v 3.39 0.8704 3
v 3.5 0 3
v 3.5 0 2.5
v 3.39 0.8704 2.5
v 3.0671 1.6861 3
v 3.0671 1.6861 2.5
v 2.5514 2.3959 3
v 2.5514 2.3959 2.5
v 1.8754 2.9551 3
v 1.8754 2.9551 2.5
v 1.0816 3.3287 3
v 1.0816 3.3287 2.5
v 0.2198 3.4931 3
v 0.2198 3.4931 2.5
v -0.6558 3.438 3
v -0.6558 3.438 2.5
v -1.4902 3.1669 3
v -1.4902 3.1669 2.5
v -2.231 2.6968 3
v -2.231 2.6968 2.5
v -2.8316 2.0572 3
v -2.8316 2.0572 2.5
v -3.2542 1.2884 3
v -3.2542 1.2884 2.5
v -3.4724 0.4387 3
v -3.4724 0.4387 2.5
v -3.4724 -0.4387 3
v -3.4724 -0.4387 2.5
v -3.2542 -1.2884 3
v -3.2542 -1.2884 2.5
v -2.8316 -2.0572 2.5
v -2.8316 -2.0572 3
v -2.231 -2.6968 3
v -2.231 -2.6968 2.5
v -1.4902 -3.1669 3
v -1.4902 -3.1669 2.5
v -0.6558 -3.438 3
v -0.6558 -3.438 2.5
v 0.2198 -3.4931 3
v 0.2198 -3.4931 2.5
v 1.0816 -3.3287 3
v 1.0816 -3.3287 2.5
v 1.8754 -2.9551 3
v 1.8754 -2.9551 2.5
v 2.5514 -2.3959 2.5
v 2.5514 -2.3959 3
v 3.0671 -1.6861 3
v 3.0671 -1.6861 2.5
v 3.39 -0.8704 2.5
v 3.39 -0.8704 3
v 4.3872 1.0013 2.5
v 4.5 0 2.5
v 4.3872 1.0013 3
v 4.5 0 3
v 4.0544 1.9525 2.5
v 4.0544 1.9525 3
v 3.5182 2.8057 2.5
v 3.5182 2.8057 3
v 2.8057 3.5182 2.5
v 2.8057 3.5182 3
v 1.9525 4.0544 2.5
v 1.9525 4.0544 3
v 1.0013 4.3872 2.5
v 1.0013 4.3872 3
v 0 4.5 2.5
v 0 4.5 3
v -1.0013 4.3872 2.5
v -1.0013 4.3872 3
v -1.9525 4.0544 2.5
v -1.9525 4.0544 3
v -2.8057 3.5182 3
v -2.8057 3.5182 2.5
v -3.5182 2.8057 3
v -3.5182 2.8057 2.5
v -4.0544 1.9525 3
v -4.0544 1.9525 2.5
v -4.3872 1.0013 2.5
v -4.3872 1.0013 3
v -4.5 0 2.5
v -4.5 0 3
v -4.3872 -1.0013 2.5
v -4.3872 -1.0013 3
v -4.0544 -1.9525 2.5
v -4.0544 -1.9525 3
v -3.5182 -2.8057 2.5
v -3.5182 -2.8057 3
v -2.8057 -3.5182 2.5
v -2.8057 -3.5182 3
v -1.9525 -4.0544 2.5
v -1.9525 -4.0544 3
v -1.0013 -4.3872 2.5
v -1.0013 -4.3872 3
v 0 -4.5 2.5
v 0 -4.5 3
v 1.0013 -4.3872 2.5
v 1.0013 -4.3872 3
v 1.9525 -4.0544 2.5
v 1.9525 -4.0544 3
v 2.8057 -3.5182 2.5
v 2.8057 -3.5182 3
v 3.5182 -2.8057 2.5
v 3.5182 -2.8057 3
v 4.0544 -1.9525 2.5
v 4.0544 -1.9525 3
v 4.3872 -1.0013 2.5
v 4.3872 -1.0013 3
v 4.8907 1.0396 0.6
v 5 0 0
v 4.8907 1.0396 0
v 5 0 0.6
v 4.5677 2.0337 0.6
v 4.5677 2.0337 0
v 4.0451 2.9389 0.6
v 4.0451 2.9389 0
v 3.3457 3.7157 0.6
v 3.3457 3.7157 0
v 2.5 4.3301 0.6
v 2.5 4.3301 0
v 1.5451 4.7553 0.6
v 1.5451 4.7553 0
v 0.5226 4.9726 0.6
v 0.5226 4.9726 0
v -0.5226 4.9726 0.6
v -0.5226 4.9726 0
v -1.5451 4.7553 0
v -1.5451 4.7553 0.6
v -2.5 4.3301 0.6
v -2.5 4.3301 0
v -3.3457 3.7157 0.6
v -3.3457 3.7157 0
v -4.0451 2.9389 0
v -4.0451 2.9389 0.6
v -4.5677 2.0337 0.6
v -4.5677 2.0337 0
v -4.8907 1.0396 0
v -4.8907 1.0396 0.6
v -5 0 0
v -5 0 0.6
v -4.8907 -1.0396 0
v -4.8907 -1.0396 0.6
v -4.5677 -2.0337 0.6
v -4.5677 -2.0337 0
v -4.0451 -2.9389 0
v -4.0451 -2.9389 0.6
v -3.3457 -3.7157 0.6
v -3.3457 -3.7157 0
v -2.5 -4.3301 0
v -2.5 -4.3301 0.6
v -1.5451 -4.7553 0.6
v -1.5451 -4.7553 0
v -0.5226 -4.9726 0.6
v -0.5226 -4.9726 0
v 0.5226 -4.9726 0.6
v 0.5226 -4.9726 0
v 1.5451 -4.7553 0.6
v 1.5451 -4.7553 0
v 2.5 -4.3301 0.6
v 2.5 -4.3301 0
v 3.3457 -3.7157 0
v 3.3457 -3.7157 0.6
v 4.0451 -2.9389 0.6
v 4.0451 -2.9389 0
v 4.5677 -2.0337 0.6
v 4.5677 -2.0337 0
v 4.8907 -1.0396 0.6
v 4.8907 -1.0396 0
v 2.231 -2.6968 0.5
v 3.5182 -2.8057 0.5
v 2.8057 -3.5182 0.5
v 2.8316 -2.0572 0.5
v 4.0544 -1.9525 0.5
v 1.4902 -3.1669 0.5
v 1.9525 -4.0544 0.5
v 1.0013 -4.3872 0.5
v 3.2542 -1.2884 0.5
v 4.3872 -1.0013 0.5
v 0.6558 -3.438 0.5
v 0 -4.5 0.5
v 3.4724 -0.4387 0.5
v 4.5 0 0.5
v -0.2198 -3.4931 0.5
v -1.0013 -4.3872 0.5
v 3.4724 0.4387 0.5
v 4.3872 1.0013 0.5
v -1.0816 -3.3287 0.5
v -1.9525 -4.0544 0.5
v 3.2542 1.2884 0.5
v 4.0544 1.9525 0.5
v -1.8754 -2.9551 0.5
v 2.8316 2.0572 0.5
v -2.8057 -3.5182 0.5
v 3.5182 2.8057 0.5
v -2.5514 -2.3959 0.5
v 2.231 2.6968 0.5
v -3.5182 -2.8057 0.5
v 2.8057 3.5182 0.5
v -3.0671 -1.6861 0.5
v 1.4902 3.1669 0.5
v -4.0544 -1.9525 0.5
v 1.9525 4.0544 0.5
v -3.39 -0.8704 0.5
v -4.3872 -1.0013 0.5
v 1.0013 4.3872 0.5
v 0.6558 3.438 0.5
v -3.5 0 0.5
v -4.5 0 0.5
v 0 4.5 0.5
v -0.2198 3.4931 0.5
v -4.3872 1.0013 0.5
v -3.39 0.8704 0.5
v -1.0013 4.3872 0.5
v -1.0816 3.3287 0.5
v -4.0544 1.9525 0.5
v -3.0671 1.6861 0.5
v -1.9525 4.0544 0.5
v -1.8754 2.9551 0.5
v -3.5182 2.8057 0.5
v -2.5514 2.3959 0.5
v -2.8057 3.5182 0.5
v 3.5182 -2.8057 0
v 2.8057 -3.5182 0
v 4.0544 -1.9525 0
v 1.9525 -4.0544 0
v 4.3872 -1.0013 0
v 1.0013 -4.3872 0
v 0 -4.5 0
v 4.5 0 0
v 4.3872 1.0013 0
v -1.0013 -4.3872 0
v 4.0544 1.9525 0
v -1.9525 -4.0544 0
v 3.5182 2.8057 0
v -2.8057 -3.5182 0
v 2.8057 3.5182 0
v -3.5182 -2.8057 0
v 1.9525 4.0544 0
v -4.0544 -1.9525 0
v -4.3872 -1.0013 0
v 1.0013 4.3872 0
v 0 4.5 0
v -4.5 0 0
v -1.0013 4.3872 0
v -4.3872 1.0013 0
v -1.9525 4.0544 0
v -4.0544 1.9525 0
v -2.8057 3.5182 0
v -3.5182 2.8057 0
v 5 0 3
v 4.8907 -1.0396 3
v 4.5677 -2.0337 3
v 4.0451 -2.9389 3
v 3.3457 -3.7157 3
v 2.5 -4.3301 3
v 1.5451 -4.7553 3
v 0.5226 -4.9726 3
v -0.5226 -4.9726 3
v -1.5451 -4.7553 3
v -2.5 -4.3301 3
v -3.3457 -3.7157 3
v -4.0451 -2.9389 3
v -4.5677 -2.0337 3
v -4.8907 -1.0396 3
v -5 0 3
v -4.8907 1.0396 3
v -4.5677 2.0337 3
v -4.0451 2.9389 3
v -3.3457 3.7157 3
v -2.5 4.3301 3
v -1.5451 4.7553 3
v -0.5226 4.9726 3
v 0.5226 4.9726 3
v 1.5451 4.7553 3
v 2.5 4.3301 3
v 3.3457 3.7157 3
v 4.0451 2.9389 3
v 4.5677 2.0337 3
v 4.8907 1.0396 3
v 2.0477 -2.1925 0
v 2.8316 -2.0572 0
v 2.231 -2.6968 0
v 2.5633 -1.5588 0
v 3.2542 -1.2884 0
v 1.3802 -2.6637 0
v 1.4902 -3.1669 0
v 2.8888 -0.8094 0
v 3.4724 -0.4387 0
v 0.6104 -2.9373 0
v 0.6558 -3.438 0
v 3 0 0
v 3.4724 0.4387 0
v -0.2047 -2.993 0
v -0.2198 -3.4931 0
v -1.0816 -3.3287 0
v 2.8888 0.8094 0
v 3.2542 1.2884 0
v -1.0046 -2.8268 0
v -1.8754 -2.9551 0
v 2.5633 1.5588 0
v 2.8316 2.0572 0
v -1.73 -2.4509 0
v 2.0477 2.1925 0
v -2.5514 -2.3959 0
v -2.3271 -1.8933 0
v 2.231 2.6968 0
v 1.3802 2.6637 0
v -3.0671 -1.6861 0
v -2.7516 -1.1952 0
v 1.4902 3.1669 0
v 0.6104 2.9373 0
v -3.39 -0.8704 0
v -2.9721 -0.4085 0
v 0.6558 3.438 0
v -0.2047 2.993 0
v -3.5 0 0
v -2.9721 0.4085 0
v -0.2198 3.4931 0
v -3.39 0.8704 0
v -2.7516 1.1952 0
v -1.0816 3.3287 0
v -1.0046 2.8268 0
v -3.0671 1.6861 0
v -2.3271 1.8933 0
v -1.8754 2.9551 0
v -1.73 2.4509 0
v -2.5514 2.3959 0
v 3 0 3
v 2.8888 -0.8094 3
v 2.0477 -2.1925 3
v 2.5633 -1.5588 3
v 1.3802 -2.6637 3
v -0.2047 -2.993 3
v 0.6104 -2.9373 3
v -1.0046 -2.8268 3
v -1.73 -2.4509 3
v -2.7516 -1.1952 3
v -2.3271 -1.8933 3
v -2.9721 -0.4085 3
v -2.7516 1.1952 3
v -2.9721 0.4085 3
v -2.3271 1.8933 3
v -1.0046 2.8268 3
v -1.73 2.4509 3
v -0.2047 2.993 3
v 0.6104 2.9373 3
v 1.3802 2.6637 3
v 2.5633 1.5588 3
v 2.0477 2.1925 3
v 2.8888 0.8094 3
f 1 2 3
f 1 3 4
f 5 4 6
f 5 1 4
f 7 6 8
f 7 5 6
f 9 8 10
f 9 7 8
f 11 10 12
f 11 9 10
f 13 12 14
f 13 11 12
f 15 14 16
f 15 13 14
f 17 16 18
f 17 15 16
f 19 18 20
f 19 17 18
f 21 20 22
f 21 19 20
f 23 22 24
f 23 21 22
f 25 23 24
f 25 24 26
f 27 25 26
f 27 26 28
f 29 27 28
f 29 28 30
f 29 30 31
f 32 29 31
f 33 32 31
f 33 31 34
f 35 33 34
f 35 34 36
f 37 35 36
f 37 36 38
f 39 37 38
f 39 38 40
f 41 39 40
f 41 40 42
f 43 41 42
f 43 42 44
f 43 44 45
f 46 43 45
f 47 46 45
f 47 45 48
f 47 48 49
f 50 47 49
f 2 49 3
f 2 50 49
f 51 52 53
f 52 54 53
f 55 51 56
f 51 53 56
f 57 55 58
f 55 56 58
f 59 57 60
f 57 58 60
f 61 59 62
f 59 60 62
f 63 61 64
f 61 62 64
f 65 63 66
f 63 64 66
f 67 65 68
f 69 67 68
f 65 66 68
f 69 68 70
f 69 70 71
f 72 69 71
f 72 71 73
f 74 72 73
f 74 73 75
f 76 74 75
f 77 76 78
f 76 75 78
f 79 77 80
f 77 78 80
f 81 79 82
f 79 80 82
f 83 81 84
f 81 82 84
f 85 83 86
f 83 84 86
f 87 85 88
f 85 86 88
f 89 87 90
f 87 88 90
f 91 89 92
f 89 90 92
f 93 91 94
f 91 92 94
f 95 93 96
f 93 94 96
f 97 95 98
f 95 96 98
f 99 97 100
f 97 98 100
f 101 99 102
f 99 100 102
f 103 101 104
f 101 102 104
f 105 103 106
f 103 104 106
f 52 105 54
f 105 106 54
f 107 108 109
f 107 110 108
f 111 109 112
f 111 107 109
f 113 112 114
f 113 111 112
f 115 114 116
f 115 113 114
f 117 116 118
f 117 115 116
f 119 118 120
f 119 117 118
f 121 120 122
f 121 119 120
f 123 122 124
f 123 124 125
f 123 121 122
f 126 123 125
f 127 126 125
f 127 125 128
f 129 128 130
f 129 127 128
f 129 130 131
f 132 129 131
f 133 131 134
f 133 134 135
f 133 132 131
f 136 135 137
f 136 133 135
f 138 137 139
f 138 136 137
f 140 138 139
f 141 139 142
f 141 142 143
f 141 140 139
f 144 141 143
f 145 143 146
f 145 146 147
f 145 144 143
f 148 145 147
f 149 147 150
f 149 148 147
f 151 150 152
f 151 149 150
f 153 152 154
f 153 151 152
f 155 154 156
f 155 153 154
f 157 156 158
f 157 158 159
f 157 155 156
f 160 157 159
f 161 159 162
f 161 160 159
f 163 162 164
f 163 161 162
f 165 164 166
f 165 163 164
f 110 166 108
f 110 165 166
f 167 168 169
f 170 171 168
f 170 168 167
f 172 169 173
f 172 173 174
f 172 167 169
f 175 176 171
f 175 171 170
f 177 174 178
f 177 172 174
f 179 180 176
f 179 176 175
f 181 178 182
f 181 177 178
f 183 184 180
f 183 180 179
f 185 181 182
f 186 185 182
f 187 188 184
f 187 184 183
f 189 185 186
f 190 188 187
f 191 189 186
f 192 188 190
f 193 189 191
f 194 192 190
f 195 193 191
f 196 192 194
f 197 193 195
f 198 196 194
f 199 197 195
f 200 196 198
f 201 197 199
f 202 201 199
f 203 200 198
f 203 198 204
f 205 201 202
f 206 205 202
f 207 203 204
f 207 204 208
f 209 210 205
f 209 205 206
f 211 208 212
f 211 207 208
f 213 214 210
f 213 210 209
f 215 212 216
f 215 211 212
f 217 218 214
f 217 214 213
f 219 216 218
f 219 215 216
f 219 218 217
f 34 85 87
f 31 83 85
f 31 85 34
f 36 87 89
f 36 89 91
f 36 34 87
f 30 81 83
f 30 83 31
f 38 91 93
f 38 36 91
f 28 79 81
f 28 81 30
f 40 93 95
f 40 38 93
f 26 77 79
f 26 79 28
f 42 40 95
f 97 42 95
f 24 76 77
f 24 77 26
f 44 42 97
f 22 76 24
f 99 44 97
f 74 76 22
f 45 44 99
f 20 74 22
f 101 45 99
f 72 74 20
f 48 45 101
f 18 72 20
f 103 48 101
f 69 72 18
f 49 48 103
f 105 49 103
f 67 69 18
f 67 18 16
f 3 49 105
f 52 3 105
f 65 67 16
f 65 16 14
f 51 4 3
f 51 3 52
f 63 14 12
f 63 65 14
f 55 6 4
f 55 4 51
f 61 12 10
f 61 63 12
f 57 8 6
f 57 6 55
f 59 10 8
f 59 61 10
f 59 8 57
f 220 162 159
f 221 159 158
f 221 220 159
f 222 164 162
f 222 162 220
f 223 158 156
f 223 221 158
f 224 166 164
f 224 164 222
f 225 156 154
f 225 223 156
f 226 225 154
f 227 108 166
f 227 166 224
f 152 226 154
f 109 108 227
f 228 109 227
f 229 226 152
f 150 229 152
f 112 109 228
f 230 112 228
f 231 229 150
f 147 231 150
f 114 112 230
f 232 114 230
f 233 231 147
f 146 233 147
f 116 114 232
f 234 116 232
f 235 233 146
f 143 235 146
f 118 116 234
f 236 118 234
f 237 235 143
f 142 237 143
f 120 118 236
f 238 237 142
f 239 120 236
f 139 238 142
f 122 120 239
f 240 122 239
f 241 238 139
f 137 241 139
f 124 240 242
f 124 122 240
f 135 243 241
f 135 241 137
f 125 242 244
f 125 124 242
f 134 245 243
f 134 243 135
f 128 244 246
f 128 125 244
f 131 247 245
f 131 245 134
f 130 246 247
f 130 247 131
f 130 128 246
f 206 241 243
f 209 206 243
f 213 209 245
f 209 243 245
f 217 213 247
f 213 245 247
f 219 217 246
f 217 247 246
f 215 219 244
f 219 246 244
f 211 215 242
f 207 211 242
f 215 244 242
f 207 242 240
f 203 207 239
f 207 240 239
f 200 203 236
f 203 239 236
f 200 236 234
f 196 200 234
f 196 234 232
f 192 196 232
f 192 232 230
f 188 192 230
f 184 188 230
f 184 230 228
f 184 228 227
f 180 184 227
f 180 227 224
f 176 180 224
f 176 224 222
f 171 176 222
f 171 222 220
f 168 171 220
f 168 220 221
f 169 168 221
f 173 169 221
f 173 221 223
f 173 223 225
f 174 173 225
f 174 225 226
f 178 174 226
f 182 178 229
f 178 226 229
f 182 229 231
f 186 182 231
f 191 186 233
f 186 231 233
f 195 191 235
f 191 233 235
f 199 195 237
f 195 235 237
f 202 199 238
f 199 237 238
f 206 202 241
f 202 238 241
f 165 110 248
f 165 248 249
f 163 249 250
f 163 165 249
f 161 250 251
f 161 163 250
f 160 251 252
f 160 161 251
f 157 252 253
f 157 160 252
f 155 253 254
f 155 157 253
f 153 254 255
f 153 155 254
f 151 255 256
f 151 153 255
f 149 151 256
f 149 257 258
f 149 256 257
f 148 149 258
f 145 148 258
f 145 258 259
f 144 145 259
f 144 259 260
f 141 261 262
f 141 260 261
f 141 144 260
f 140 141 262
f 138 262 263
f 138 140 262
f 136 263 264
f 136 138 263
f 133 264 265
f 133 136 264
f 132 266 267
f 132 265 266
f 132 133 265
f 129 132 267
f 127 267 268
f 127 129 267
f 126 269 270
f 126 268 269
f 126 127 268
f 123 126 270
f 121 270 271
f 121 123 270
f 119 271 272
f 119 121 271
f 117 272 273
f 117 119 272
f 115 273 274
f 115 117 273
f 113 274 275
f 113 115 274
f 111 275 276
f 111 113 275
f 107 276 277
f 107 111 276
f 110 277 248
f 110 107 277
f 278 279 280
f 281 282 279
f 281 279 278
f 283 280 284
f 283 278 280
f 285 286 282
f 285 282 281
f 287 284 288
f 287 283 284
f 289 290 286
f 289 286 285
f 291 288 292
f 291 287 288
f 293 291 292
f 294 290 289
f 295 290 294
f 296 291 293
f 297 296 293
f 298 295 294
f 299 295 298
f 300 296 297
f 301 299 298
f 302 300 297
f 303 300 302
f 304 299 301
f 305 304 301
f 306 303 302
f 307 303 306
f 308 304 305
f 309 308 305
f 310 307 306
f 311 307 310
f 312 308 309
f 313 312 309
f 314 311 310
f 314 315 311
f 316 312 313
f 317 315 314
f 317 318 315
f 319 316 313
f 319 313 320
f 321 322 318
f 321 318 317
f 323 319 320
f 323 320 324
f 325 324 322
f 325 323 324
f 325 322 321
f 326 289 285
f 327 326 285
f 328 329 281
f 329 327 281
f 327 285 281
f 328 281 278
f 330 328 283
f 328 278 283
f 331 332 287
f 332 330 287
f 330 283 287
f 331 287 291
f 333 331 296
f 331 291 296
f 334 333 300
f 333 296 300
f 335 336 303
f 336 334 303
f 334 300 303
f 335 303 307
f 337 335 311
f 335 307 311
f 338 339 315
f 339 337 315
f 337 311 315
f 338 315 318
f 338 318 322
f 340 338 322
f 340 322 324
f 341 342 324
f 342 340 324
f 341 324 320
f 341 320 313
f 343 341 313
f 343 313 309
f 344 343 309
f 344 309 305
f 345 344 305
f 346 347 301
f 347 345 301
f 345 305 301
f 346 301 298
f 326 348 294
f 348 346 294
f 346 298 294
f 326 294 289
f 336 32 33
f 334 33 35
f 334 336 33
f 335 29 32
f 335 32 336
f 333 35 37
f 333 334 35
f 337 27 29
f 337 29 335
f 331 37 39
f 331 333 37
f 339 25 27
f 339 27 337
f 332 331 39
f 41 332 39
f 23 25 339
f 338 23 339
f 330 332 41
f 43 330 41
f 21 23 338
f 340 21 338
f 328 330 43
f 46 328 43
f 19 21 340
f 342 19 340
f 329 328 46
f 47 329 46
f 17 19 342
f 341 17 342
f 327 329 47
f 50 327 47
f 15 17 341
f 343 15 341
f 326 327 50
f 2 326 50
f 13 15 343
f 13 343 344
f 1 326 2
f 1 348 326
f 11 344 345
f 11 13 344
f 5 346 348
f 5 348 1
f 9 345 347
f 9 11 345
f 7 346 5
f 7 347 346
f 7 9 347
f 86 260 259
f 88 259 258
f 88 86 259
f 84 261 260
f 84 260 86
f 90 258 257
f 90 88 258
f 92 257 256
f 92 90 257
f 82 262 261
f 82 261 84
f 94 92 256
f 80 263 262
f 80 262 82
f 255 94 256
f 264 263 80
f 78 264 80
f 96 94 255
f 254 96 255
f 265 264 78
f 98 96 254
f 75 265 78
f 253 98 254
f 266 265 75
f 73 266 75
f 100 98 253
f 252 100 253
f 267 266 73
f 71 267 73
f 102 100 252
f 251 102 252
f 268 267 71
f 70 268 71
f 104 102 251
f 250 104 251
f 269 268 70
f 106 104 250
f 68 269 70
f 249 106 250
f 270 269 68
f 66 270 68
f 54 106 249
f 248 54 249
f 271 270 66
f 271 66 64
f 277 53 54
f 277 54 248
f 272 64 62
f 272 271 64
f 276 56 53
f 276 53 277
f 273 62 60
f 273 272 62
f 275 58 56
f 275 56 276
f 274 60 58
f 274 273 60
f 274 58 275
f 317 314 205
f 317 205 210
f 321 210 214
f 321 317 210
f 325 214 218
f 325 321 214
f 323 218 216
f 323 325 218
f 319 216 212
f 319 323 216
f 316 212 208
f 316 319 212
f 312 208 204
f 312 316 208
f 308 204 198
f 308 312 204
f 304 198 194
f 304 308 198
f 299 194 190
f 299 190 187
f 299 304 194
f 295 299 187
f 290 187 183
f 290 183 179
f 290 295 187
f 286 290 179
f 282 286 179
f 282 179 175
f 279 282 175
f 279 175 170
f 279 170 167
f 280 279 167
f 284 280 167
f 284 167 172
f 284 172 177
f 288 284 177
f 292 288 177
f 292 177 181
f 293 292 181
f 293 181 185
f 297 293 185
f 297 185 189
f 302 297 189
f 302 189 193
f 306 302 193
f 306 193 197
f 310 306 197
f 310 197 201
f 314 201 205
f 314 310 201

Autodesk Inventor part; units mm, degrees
ref_plane "YZ Plane" through (0, 0, 0) normal (1, 0, 0) x (0, 1, 0)
ref_plane "XZ Plane" through (0, 0, 0) normal (0, 1, 0) x (-1, 0, 0)
ref_plane "XY Plane" through (0, 0, 0) normal (0, 0, 1) x (1, 0, 0)
sketch "スケッチ1" plane through (0, 0, 0) normal (0, 0, 1) x (1, 0, 0)
  circle A0 centre (0, 0) radius 3
  circle A1 centre (0, 0) radius 5
  dimension "d0" = 6
  dimension "d1" = 10
extrude "押し出し1" add sketch "スケッチ1" along normal blind 3
sketch "スケッチ2" plane through (0, 0, 0) normal (0, 0, -1) x (-1, 0, 0)
  circle A0 centre (0, 0) radius 3 projected
  circle A1 centre (0, 0) radius 5 projected
  circle A2 centre (0, 0) radius 5.6
  dimension "d4" = 11.2
extrude "押し出し2" add sketch "スケッチ2" against normal blind 0.6 contours A2
sketch "スケッチ3" plane through (0, 0, 3) normal (0, 0, 1) x (1, 0, 0)
  circle A0 centre (0, 0) radius 3 projected
  circle A1 centre (0, 0) radius 5 projected
  circle A2 centre (0, 0) radius 4.5
  circle A3 centre (0, 0) radius 3.5
  dimension "d7" = 0.5
  dimension "d8" = 0.5
extrude "押し出し3" cut sketch "スケッチ3" against normal blind 0.5 contours A2
sketch "スケッチ4" plane through (0, 0, 0) normal (0, 0, -1) x (-1, 0, 0)
  circle A0 centre (0, 0) radius 3.5 projected
  circle A1 centre (0, 0) radius 4.5 projected
extrude "押し出し4" cut sketch "スケッチ4" against normal blind 0.5
sketch "スケッチ5" plane through (0, 0, 0) normal (0, 0, -1) x (-1, 0, 0)
  point P0 (0, 0)
sketch "スケッチ6" plane through (0, 0, 0.6) normal (0, 0, 1) x (1, 0, 0)
  circle A0 centre (0, 0) radius 5
  circle A1 centre (0, 0) radius 5.6
  dimension "d13" = 10
  dimension "d14" = 0.6
extrude "押し出し5" cut sketch "スケッチ6" against normal blind 0.6
properties part number "ベアリングHd6-D10-B3F無し甲" material "鋼、炭素鋼"
